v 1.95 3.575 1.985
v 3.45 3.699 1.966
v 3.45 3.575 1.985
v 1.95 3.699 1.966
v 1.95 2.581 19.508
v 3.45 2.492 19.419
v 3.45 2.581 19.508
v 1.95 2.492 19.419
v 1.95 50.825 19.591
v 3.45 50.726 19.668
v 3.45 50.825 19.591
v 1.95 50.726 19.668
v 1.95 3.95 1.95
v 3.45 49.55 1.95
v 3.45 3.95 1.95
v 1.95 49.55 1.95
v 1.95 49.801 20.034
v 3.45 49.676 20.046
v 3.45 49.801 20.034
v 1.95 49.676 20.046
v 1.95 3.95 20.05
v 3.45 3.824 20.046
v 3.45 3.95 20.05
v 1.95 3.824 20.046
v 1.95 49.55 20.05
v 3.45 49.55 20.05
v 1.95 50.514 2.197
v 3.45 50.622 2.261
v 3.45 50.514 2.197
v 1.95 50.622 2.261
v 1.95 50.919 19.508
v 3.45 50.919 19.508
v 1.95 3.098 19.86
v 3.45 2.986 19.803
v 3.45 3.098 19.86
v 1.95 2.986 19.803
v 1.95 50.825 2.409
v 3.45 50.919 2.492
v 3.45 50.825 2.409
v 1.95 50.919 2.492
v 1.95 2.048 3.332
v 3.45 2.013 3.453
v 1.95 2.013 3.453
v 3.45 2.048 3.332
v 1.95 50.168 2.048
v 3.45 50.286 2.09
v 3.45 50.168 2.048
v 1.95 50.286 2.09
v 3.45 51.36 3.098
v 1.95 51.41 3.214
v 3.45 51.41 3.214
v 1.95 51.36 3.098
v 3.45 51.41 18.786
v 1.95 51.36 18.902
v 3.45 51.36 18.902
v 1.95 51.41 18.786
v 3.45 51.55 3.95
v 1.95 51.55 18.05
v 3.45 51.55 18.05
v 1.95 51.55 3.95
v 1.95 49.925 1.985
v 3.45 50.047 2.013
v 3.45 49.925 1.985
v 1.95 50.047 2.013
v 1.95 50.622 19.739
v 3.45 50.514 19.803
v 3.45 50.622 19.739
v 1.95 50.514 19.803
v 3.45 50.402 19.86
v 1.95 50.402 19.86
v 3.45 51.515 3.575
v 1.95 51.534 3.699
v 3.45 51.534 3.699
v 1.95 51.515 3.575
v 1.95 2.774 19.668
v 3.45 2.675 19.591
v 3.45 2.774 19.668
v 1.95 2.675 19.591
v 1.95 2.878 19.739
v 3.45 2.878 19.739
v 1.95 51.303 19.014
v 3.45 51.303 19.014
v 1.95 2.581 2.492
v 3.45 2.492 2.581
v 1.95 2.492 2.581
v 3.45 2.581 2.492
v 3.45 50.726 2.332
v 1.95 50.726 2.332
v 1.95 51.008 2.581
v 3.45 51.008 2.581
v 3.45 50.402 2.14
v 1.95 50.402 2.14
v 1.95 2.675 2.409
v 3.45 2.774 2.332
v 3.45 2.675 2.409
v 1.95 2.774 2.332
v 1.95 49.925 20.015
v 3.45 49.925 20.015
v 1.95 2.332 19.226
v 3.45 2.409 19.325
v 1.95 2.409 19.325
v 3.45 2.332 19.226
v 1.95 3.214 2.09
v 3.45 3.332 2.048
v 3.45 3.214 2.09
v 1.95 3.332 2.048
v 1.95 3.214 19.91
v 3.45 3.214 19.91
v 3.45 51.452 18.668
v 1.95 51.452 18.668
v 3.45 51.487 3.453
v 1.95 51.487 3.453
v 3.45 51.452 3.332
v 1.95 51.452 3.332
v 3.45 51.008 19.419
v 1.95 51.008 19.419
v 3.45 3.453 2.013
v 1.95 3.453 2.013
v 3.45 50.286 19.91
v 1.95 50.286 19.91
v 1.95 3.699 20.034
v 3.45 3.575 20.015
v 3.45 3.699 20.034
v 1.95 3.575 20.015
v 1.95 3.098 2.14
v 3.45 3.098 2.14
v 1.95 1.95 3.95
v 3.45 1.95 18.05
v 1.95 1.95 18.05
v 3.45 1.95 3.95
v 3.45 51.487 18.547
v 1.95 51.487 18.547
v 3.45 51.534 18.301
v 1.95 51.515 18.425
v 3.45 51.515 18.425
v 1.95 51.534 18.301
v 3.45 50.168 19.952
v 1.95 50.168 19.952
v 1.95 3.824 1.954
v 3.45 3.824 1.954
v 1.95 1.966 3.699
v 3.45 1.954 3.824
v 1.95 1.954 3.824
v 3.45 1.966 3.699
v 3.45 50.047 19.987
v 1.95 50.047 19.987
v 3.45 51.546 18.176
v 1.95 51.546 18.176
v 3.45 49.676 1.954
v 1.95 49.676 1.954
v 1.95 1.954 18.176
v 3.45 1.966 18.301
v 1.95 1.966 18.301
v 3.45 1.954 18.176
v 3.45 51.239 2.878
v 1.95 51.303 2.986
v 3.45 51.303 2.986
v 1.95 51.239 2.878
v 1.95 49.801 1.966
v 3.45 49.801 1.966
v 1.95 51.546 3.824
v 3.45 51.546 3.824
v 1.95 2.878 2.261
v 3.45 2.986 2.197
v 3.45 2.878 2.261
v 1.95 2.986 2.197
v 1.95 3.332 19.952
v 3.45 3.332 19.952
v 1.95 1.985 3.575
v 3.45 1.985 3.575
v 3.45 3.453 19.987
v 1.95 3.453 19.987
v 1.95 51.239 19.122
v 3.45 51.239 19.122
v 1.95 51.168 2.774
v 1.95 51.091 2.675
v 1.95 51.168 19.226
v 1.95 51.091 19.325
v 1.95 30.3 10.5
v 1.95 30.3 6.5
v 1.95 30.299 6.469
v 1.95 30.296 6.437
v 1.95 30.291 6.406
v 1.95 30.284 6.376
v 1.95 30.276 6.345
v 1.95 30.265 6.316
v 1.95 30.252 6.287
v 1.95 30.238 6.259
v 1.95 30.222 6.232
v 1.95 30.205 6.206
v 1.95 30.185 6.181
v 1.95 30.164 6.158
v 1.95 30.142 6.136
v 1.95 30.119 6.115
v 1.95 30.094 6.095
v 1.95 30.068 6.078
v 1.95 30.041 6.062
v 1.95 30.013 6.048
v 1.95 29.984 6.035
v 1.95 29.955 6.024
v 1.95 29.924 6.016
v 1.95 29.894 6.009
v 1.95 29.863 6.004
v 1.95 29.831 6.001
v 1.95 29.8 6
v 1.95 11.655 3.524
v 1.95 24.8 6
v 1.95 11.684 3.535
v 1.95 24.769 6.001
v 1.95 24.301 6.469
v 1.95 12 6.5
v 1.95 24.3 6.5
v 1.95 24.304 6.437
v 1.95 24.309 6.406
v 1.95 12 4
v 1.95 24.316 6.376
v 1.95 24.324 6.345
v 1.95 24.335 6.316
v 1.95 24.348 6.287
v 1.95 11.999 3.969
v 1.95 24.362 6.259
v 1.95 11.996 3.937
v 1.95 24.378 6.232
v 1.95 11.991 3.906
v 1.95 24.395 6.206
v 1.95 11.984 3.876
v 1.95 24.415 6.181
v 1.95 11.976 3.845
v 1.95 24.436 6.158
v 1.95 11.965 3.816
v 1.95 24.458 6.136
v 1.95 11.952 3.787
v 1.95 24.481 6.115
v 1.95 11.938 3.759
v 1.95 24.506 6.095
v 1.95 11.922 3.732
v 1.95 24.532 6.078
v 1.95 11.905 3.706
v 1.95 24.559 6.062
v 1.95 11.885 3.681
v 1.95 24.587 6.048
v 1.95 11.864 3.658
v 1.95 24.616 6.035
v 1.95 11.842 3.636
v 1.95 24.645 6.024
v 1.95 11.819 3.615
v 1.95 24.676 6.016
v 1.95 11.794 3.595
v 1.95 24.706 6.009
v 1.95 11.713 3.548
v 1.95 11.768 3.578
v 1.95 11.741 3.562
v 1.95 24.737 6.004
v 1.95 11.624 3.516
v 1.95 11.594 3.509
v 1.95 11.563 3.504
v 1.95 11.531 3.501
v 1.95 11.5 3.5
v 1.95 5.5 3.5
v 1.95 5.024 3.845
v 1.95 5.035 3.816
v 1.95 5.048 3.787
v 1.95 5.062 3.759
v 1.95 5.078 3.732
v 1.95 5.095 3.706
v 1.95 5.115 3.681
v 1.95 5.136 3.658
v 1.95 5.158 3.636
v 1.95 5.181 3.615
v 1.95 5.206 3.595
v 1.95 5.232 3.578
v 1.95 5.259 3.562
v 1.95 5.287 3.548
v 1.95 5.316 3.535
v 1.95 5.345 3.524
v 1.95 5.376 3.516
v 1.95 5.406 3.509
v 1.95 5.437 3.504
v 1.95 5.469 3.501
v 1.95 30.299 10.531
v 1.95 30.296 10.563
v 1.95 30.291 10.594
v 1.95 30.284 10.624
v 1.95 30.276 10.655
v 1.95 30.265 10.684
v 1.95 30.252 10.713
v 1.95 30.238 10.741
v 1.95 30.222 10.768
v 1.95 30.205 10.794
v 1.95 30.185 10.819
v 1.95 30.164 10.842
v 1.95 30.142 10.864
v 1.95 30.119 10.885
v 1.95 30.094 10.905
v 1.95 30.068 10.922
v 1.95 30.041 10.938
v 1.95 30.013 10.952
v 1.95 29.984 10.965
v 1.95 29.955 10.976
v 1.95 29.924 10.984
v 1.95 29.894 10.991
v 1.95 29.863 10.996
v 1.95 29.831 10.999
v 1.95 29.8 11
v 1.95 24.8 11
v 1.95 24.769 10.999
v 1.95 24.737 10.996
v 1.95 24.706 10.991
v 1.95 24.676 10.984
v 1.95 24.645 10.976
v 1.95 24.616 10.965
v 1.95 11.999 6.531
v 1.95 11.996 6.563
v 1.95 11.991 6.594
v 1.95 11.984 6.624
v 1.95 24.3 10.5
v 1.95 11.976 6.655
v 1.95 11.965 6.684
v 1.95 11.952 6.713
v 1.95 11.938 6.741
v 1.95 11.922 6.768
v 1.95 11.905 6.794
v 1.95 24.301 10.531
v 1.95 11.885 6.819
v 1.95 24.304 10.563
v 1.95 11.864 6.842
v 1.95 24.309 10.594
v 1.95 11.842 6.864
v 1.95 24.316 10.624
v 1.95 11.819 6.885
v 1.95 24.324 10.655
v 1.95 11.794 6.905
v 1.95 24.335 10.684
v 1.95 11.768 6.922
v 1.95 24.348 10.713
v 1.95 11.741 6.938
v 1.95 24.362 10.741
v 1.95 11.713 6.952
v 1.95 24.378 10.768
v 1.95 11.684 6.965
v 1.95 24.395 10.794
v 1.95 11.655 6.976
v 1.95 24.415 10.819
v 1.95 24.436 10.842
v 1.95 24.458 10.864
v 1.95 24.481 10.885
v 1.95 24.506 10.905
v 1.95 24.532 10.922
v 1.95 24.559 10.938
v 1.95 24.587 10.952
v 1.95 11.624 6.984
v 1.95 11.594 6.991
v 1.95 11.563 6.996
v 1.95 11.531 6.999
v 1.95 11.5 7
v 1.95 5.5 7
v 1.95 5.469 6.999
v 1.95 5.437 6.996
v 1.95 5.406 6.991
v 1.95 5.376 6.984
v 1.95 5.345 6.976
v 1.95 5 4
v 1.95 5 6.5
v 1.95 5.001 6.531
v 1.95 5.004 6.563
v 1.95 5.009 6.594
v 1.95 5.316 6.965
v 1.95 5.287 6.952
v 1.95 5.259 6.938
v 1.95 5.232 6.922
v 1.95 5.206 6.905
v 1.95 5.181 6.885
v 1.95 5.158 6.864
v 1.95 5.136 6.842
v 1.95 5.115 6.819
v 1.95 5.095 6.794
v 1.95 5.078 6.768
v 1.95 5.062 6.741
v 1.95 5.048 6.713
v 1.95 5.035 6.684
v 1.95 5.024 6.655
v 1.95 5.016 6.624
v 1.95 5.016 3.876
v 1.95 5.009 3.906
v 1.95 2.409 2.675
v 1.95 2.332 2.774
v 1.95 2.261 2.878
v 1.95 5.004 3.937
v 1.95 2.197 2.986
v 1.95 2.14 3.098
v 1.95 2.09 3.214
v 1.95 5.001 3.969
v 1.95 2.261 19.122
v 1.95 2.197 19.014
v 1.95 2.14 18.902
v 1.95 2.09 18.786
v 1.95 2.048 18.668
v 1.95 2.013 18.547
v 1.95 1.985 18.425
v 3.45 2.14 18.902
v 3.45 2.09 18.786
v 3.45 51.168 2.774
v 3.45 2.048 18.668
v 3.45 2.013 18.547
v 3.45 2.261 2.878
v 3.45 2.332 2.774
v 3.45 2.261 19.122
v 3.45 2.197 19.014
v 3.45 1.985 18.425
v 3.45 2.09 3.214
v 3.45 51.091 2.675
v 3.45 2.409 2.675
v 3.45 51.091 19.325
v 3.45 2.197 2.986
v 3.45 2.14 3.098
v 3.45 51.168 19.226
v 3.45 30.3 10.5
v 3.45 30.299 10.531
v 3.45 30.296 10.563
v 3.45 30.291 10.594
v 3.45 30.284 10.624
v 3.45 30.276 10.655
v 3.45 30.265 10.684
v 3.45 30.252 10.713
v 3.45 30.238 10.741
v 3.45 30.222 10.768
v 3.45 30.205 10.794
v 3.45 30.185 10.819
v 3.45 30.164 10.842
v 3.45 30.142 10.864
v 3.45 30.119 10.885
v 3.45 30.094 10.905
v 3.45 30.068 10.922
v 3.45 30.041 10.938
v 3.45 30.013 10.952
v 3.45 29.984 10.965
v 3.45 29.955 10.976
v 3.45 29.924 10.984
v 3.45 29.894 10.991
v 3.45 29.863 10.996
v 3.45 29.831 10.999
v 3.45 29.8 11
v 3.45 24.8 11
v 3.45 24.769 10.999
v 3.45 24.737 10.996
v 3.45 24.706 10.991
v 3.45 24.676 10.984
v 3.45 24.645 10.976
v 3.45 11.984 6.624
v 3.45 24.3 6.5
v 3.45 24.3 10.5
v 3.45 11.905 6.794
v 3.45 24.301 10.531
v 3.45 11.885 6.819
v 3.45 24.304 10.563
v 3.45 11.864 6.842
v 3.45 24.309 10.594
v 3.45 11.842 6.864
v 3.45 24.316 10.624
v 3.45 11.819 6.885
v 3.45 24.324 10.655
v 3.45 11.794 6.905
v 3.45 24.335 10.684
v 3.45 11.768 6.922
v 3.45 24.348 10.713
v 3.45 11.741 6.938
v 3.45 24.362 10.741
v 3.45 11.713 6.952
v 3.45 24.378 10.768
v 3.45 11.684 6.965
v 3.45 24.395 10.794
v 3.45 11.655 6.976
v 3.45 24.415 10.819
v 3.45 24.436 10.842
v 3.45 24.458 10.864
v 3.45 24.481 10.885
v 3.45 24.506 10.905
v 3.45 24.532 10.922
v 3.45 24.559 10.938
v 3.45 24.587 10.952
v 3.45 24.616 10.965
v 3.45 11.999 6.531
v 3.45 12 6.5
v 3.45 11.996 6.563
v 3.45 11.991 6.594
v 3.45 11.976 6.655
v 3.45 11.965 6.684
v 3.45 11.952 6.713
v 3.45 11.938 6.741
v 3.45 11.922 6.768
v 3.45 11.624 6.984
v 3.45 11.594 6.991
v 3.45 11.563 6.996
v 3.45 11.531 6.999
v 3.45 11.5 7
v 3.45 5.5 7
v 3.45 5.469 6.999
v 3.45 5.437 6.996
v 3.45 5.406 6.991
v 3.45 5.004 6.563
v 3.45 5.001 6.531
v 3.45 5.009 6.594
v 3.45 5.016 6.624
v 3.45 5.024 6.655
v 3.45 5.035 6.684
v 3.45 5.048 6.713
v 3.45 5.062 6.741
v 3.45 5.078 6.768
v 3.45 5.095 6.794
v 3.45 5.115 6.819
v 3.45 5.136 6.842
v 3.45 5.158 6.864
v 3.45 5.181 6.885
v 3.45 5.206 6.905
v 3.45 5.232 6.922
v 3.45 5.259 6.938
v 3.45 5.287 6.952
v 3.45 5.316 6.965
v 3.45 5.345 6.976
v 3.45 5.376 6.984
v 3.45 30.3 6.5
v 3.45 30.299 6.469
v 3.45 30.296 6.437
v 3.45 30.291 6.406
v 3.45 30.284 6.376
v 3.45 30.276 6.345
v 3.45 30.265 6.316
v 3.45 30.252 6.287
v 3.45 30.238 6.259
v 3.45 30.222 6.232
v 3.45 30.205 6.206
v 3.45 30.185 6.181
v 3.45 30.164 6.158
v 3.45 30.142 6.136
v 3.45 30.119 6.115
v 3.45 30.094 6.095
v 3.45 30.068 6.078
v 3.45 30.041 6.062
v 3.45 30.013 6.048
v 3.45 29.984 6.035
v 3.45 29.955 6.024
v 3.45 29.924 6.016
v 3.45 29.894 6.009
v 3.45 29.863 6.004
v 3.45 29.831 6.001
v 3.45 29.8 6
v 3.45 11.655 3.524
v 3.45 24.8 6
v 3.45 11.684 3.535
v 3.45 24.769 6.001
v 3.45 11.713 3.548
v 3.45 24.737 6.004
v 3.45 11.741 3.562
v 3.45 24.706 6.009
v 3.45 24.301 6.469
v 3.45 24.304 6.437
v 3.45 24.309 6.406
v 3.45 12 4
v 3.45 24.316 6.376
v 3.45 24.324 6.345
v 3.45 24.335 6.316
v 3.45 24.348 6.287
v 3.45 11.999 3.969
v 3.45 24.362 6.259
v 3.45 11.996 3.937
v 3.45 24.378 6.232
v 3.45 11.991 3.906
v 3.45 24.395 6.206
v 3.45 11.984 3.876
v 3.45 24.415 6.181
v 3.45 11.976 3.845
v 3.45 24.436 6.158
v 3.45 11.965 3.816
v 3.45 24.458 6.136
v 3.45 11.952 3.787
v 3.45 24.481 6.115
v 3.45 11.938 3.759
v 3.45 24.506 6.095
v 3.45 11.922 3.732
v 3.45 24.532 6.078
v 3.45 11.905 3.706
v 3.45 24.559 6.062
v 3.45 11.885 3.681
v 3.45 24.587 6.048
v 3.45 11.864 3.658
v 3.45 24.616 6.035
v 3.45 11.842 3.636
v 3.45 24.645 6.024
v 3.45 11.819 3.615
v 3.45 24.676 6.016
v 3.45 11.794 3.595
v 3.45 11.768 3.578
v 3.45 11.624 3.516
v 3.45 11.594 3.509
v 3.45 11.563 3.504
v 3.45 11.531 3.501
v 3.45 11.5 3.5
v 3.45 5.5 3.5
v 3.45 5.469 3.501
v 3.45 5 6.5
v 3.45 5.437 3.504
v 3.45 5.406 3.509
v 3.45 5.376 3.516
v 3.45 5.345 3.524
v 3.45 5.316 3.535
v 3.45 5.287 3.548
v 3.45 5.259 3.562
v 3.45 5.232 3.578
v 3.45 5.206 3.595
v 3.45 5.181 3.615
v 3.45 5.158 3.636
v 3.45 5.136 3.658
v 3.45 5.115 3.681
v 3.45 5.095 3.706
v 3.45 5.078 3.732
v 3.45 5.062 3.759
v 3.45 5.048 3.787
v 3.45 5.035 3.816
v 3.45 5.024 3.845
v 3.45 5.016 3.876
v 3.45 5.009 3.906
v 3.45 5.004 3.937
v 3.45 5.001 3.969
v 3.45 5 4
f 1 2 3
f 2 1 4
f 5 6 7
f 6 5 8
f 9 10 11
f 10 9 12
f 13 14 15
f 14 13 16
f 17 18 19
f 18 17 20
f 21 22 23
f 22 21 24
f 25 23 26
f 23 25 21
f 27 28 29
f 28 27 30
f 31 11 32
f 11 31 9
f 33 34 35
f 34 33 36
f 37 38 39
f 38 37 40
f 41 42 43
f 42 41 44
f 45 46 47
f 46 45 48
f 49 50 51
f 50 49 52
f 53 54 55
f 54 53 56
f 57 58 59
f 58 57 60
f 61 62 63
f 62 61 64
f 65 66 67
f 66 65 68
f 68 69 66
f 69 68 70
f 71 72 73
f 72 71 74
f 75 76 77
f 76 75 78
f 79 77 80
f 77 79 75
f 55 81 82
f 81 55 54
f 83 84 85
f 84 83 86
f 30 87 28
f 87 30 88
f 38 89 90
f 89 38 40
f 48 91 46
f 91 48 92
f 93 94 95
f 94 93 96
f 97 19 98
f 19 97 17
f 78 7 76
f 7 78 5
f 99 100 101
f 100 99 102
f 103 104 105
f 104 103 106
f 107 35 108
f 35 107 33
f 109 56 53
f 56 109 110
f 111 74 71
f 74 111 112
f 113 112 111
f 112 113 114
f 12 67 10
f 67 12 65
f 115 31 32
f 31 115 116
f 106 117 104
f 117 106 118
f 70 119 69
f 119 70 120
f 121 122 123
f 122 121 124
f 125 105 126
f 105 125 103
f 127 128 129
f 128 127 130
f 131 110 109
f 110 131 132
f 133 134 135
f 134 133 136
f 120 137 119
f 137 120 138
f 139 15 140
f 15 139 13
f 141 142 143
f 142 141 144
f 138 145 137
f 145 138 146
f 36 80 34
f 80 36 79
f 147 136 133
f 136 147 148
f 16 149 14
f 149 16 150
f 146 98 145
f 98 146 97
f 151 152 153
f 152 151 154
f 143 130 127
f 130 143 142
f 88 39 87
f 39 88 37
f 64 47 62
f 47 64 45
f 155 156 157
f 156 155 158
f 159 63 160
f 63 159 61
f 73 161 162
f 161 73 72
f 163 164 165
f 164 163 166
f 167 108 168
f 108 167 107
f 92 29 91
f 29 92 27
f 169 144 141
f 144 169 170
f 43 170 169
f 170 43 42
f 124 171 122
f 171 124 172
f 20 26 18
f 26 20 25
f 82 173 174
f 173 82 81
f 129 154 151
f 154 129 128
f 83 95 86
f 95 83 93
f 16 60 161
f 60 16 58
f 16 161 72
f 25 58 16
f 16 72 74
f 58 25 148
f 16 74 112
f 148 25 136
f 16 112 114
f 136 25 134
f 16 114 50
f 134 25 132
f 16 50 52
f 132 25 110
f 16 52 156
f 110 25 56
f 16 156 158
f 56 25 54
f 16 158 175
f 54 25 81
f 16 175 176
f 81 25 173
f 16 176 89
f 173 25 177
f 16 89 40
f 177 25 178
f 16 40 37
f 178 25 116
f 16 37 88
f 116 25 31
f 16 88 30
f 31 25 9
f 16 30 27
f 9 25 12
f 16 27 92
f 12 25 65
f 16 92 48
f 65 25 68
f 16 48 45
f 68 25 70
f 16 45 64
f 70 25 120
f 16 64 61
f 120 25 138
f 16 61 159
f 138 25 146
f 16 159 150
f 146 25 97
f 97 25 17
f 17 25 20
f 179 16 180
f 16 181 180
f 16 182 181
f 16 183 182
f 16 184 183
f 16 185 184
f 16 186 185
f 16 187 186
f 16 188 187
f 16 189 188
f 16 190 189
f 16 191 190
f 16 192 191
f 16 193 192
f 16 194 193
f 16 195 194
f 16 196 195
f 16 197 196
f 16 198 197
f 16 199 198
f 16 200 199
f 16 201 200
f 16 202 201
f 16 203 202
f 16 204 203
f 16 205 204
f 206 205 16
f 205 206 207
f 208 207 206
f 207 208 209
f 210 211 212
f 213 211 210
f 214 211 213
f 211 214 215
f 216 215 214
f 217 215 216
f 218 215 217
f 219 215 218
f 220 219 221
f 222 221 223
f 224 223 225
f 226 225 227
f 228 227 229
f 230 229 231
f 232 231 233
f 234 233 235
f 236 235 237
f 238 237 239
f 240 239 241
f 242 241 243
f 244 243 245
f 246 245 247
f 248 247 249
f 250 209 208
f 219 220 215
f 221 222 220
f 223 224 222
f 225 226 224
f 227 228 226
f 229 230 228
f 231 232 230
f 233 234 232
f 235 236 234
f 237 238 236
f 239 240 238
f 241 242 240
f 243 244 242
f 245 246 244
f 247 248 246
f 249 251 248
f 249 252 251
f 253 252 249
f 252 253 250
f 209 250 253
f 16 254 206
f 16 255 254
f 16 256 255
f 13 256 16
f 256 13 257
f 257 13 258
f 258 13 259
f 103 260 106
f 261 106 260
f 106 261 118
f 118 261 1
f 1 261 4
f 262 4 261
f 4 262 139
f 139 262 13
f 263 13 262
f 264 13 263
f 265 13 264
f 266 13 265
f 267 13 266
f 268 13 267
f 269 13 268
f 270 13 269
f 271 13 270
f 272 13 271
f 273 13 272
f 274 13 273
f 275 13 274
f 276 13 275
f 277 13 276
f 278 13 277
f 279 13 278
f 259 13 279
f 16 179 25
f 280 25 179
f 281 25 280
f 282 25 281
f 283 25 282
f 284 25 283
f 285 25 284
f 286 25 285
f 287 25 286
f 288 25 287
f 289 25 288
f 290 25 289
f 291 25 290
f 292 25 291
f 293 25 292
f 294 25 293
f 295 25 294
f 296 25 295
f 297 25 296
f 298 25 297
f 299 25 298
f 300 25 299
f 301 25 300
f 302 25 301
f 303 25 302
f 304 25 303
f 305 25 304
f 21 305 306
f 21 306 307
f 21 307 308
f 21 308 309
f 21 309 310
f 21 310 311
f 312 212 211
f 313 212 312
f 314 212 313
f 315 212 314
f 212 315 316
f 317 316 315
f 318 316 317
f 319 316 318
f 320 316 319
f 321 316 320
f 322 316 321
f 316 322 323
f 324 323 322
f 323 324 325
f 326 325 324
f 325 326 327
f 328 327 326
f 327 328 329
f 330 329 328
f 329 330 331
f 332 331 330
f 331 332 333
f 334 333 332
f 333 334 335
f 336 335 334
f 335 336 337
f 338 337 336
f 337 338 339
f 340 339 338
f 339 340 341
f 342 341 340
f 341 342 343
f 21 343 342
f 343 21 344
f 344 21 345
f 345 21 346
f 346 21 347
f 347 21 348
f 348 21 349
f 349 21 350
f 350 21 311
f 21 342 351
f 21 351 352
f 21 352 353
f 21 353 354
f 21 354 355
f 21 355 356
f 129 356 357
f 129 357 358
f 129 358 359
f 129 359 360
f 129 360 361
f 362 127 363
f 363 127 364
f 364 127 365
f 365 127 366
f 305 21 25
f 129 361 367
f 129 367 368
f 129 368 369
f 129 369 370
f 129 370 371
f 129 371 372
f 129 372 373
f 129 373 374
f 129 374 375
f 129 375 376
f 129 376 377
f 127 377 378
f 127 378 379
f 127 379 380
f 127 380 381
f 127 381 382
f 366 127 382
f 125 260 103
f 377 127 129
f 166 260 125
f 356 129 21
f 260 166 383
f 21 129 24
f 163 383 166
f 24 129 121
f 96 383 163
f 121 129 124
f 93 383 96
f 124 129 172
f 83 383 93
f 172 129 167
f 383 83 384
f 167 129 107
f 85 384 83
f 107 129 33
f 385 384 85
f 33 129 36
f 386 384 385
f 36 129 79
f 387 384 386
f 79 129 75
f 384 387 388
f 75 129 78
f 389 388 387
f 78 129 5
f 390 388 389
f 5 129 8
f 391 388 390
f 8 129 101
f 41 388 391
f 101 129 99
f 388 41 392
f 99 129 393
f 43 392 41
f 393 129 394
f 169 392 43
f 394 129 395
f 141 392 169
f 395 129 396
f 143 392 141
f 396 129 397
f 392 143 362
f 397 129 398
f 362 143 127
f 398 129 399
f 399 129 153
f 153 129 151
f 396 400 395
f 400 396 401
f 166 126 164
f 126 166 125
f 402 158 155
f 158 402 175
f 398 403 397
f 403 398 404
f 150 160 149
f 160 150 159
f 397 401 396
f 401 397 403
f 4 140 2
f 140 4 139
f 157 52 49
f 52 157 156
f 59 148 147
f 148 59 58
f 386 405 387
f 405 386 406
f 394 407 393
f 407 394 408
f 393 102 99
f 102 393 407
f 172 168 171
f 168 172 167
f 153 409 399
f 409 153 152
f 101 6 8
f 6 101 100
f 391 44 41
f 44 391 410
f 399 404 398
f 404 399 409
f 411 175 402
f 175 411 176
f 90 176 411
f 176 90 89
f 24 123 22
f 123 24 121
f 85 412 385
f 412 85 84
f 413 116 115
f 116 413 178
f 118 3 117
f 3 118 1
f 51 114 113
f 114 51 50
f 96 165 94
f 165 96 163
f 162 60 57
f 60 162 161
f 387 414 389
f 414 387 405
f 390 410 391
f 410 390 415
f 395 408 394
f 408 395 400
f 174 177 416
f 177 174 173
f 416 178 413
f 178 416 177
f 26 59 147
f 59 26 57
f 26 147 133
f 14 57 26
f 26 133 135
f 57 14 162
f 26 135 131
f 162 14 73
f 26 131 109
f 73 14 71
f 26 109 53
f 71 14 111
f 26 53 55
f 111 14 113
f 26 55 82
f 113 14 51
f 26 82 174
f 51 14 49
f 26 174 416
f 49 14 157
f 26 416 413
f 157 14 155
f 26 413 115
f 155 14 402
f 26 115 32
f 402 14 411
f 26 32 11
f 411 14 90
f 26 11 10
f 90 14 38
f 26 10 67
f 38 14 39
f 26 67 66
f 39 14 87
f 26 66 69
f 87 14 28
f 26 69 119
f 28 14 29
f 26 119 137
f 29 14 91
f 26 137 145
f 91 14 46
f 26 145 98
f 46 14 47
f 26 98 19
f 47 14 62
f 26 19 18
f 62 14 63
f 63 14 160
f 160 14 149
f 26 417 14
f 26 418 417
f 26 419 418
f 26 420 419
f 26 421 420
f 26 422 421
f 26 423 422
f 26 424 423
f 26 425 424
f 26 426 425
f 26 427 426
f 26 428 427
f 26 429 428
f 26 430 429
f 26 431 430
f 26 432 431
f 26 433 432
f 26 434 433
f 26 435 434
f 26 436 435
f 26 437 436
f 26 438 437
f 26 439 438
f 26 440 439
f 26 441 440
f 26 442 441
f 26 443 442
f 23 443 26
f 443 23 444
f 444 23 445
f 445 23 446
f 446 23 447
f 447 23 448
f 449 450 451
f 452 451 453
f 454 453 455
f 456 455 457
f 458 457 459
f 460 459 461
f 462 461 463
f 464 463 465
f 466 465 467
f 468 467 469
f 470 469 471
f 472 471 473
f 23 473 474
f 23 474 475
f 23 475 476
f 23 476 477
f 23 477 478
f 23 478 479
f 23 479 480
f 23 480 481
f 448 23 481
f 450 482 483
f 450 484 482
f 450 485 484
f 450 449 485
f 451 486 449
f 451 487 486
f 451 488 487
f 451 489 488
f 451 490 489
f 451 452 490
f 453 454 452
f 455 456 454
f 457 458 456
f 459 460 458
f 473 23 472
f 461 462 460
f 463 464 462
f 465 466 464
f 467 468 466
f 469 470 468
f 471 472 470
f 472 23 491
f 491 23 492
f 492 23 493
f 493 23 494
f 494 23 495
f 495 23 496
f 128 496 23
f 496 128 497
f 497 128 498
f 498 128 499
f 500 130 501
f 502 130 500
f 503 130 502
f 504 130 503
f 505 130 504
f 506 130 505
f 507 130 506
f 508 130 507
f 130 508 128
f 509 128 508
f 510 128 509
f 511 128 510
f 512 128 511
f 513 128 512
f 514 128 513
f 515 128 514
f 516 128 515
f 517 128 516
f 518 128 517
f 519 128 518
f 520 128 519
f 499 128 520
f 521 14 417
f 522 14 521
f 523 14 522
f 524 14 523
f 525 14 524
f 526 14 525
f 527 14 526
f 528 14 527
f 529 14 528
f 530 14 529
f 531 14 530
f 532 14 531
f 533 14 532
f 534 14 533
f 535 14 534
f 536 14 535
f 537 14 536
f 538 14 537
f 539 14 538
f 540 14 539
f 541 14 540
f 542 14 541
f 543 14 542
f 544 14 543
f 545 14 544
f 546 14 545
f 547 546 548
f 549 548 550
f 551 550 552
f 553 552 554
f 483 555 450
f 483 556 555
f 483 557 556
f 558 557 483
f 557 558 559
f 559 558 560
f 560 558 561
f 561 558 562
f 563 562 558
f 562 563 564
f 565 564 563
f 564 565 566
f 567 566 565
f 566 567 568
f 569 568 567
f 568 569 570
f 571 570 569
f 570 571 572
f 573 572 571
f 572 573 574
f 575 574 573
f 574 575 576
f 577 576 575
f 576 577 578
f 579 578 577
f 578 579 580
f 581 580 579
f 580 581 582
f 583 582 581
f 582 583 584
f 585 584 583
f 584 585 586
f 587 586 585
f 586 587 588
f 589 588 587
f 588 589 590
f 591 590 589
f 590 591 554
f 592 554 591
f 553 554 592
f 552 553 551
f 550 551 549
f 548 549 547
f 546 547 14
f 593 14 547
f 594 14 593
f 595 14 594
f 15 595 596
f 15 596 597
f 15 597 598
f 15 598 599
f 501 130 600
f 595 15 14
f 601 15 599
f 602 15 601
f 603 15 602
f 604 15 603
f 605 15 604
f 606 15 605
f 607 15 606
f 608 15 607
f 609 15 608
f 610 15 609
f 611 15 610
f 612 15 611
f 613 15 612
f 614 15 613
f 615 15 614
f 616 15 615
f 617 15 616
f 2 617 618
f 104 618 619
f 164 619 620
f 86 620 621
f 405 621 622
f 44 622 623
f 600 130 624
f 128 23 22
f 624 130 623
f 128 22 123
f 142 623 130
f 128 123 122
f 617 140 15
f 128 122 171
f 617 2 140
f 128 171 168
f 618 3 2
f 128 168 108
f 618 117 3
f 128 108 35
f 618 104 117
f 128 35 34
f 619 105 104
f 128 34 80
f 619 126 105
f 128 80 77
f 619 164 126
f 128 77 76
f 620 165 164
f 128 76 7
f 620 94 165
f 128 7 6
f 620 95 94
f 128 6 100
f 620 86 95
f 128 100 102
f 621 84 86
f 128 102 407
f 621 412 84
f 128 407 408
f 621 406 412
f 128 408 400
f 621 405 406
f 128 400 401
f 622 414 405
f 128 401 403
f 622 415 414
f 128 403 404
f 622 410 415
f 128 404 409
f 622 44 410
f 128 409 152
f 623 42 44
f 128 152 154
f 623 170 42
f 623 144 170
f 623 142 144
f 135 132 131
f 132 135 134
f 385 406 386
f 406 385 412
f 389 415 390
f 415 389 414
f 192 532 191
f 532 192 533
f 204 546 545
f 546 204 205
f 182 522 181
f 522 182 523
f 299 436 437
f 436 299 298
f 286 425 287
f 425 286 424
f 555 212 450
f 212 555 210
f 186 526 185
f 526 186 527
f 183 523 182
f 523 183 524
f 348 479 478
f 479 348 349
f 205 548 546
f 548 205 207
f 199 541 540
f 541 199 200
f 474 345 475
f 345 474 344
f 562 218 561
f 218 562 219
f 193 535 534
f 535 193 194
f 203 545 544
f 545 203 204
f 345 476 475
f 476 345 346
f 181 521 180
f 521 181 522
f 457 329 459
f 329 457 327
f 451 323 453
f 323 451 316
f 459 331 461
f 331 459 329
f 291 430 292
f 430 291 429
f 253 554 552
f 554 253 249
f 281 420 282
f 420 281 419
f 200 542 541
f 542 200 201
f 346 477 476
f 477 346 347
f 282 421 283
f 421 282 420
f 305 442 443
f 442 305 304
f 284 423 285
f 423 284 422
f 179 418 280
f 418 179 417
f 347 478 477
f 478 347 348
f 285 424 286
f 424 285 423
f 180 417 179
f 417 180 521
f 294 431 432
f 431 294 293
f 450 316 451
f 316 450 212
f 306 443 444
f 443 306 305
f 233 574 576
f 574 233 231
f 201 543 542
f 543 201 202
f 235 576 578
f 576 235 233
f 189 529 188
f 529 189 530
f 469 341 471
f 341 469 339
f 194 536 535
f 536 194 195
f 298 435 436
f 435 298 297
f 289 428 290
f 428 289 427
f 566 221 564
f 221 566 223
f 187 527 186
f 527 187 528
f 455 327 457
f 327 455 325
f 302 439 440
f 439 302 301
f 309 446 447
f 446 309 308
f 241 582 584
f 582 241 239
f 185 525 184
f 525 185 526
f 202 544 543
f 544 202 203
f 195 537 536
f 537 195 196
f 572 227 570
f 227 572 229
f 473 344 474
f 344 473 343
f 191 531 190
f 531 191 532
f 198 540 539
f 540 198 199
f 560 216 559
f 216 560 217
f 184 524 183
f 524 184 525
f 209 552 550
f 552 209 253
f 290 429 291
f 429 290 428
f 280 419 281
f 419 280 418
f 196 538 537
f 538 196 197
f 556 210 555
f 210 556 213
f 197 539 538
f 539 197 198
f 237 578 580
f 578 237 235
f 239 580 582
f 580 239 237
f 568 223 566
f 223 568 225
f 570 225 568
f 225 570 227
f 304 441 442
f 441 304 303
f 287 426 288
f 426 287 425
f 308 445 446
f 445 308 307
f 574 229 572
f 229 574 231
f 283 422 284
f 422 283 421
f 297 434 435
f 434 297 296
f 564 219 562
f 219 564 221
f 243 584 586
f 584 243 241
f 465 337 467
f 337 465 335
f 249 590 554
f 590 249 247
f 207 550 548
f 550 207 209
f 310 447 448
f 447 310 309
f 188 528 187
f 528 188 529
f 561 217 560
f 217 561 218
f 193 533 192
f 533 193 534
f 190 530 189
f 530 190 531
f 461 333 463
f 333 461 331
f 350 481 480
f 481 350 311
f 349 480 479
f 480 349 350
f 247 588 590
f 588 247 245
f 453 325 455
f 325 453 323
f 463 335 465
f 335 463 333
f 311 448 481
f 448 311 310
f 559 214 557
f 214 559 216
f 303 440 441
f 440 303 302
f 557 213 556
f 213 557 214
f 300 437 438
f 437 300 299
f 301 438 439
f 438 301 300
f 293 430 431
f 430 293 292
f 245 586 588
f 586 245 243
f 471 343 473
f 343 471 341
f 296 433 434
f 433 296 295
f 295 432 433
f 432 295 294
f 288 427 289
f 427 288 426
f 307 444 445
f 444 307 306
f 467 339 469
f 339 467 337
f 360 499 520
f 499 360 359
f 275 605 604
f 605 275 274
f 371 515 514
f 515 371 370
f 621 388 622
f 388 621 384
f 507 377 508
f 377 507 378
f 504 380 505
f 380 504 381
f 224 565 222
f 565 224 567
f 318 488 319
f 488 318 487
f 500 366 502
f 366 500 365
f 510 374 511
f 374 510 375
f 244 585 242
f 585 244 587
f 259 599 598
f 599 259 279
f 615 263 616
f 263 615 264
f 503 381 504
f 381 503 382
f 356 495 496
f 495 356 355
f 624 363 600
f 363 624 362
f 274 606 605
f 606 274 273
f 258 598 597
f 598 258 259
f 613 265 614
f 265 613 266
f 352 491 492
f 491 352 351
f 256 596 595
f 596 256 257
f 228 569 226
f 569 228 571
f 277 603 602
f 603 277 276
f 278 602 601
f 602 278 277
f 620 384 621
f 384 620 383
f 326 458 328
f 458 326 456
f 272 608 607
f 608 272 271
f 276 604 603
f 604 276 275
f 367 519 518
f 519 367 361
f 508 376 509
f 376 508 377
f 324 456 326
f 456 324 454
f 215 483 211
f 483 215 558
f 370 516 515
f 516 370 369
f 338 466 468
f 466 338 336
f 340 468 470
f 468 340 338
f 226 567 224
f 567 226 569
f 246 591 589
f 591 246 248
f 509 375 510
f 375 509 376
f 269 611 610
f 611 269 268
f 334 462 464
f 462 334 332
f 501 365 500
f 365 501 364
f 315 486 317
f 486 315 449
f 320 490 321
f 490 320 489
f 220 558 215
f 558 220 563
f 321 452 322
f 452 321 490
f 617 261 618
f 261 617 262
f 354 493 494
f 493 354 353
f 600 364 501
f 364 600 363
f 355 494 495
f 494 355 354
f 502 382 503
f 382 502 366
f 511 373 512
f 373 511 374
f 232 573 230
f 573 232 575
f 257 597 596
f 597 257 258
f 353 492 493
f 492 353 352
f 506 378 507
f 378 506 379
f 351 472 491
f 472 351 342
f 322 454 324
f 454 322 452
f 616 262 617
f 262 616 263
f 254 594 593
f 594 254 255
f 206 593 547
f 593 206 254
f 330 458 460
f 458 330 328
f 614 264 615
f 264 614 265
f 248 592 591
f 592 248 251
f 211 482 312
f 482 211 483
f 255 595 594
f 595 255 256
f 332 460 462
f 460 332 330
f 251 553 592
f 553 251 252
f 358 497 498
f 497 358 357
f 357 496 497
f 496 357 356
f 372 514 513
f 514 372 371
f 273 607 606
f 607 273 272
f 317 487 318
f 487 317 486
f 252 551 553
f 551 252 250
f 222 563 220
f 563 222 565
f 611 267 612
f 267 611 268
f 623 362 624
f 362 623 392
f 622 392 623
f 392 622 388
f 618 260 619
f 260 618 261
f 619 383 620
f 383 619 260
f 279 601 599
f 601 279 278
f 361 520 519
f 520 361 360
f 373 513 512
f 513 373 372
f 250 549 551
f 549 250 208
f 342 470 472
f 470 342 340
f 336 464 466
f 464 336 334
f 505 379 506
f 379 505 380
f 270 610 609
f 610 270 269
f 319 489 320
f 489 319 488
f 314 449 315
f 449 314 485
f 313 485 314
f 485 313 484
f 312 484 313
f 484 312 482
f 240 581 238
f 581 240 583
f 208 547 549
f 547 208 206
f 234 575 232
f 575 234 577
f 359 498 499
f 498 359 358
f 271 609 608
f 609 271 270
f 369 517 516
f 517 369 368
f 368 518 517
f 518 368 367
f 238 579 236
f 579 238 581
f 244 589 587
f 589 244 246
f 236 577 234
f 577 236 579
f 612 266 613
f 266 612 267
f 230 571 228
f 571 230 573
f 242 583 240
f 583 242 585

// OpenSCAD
/*//////////////////////////////////////////////////////////////////
              -    FB Aka Heartman/Hearty 2016     -                   
              -   http://heartygfx.blogspot.com    -                  
              -       OpenScad Parametric Box      -                     
              -         CC BY-NC 3.0 License       -                      
////////////////////////////////////////////////////////////////////                                                                                                             
12/02/2016 - Fixed minor bug 
28/02/2016 - Added holes ventilation option                    
09/03/2016 - Added PCB feet support, fixed the shell artefact on export mode. 

*/////////////////////////// - Info - //////////////////////////////

// All coordinates are starting as integrated circuit pins.
// From the top view :

//   CoordD           <---       CoordC
//                                 ^
//                                 ^
//                                 ^
//   CoordA           --->       CoordB


////////////////////////////////////////////////////////////////////


////////// - Paramètres de la boite - Box parameters - /////////////

/* [Box dimensions] */
// - Longueur - Length  
  Length        = 52.5;
// - Largeur - Width
  Width         = 53.5;                     
// - Hauteur - Height  
  Height        = 22;  
// - Epaisseur - Wall thickness  
  Thick         = 1.5;//[2:5]  
  
/* [Box options] */
// - Diamètre Coin arrondi - Filet diameter  
  Filet         = 2;//[0.1:12] 
// - lissage de l'arrondi - Filet smoothness  
  Resolution    = 50;//[1:100] 
// - Tolérance - Tolerance (Panel/rails gap)
  m             = 0.9;
// Pieds PCB - PCB feet (x4) 
  PCBFeet       = 0;// [0:No, 1:Yes]
// - Decorations to ventilation holes
  Vent          = 1;// [0:No, 1:Yes]
// - Decoration-Holes width (in mm)
  Vent_width    = 1.5;   


  
/* [PCB_Feet] */
//All dimensions are from the center foot axis

// - Coin bas gauche - Low left corner X position
PCBPosX         = 1;
// - Coin bas gauche - Low left corner Y position
PCBPosY         = 1;
// - Longueur PCB - PCB Length
PCBLength       = 45;
// - Largeur PCB - PCB Width
PCBWidth        = 44.3;
// - Heuteur pied - Feet height
FootHeight      = 3;
// - Diamètre pied - Foot diameter
FootDia         = 5;
// - Diamètre trou - Hole diameter
FootHole        = 2;  
  

/* [STL element to export] */
//Coque haut - Top shell
TShell          = 0;// [0:No, 1:Yes]
//Coque bas- Bottom shell
BShell          = 0;// [0:No, 1:Yes]
//Panneau avant - Front panel
FPanL           = 0;// [0:No, 1:Yes]
//Panneau arrière - Back panel  
BPanL           = 1;// [0:No, 1:Yes]


  
/* [Hidden] */
// - Couleur coque - Shell color  
Couleur1        = "Orange";       
// - Couleur panneaux - Panels color    
Couleur2        = "OrangeRed";    
// Thick X 2 - making decorations thicker if it is a vent to make sure they go through shell
Dec_Thick       = Vent ? Thick*2 : Thick; 
// - Depth decoration
Dec_size        = Vent ? Thick*2 : 0.8;





/////////// - Boitier générique bord arrondis - Generic rounded box - //////////

module RoundBox($a=Length, $b=Width, $c=Height){// Cube bords arrondis
                    $fn=Resolution;            
                    translate([0,Filet,Filet]){  
                    minkowski (){                                              
                        cube ([$a-(Length/2),$b-(2*Filet),$c-(2*Filet)], center = false);
                        rotate([0,90,0]){    
                        cylinder(r=Filet,h=Length/2, center = false);
                            } 
                        }
                    }
                }// End of RoundBox Module

      
////////////////////////////////// - Module Coque/Shell - //////////////////////////////////         

module Coque(){//Coque - Shell  
    Thick = Thick*2;  
    difference(){    
        difference(){//sides decoration
            union(){    
                     difference() {//soustraction de la forme centrale - Substraction Fileted box
                      
                        difference(){//soustraction cube median - Median cube slicer
                            union() {//union               
                            difference(){//Coque    
                                RoundBox();
                                translate([Thick/2,Thick/2,Thick/2]){     
                                        RoundBox($a=Length-Thick, $b=Width-Thick, $c=Height-Thick);
                                        }
                                        }//Fin diff Coque                            
                                difference(){//largeur Rails        
                                     translate([Thick+m,Thick/2,Thick/2]){// Rails
                                          RoundBox($a=Length-((2*Thick)+(2*m)), $b=Width-Thick, $c=Height-(Thick*2));
                                                          }//fin Rails
                                     translate([((Thick+m/2)*1.55),Thick/2,Thick/2+0.1]){ // +0.1 added to avoid the artefact
                                          RoundBox($a=Length-((Thick*3)+2*m), $b=Width-Thick, $c=Height-Thick);
                                                    }           
                                                }//Fin largeur Rails
                                    }//Fin union                                   
                               translate([-Thick,-Thick,Height/2]){// Cube à soustraire
                                    cube ([Length+100, Width+100, Height], center=false);
                                            }                                            
                                      }//fin soustraction cube median - End Median cube slicer
                               translate([-Thick/2,Thick,Thick]){// Forme de soustraction centrale 
                                    RoundBox($a=Length+Thick, $b=Width-Thick*2, $c=Height-Thick);       
                                    }                          
                                }                                          


                difference(){// wall fixation box legs
                    union(){
                        translate([3*Thick +5,Thick,Height/2]){
                            rotate([90,0,0]){
                                    $fn=6;
                                    cylinder(d=16,Thick/2);
                                    }   
                            }
                            
                       translate([Length-((3*Thick)+5),Thick,Height/2]){
                            rotate([90,0,0]){
                                    $fn=6;
                                    cylinder(d=16,Thick/2);
                                    }   
                            }

                        }
                            translate([4,Thick+Filet,Height/2-57]){   
                             rotate([45,0,0]){
                                   cube([Length,40,40]);    
                                  }
                           }
                           translate([0,-(Thick*1.46),Height/2]){
                                cube([Length,Thick*2,10]);
                           }
                    } //Fin fixation box legs
            }

        union(){// outbox sides decorations
            
            for(i=[0:Thick:Length/4]){

                // Ventilation holes part code submitted by Ettie - Thanks ;) 
                    translate([10+i,-Dec_Thick+Dec_size,1]){
                    cube([Vent_width,Dec_Thick,Height/4]);
                    }
                    translate([(Length-10) - i,-Dec_Thick+Dec_size,1]){
                    cube([Vent_width,Dec_Thick,Height/4]);
                    }
                    translate([(Length-10) - i,Width-Dec_size,1]){
                    cube([Vent_width,Dec_Thick,Height/4]);
                    }
                    translate([10+i,Width-Dec_size,1]){
                    cube([Vent_width,Dec_Thick,Height/4]);
                    }
  
                
                    }// fin de for
               // }
                }//fin union decoration
            }//fin difference decoration


            union(){ //sides holes
                $fn=50;
                translate([3*Thick+5,20,Height/2+4]){
                    rotate([90,0,0]){
                    cylinder(d=2,20);
                    }
                }
                translate([Length-((3*Thick)+5),20,Height/2+4]){
                    rotate([90,0,0]){
                    cylinder(d=2,20);
                    }
                }
                translate([3*Thick+5,Width+5,Height/2-4]){
                    rotate([90,0,0]){
                    cylinder(d=2,20);
                    }
                }
                translate([Length-((3*Thick)+5),Width+5,Height/2-4]){
                    rotate([90,0,0]){
                    cylinder(d=2,20);
                    }
                }
            }//fin de sides holes

        }//fin de difference holes
}// fin coque 

////////////////////////////// - Experiment - ///////////////////////////////////////////





/////////////////////// - Foot with base filet - /////////////////////////////
module foot(FootDia,FootHole,FootHeight){
    Filet=2;
    color(Couleur1)   
    translate([0,0,Filet-1.5])
    difference(){
    
    difference(){
            //translate ([0,0,-Thick]){
                cylinder(d=FootDia+Filet,FootHeight-Thick, $fn=100);
                        //}
                    rotate_extrude($fn=100){
                            translate([(FootDia+Filet*2)/2,Filet,0]){
                                    minkowski(){
                                            square(10);
                                            circle(Filet, $fn=100);
                                        }
                                 }
                           }
                   }
            cylinder(d=FootHole,FootHeight+1, $fn=100);
               }          
}// Fin module foot
  
module Feet(){     
//////////////////// - PCB only visible in the preview mode - /////////////////////    
    translate([3*Thick+2,Thick+5,FootHeight+(Thick/2)-0.5]){
    
    %square ([PCBLength+10,PCBWidth+10]);
       translate([PCBLength/2,PCBWidth/2,0.5]){ 
        color("Olive")
        %text("PCB", halign="center", valign="center", font="Arial black");
       }
    } // Fin PCB 
  
    
////////////////////////////// - 4 Feet - //////////////////////////////////////////     
    translate([3*Thick+7,Thick+10,Thick/2]){
        foot(FootDia,FootHole,FootHeight);
    }
    translate([(3*Thick)+PCBLength+7,Thick+10,Thick/2]){
        foot(FootDia,FootHole,FootHeight);
        }
    translate([(3*Thick)+PCBLength+7,(Thick)+PCBWidth+10,Thick/2]){
        foot(FootDia,FootHole,FootHeight);
        }        
    translate([3*Thick+7,(Thick)+PCBWidth+10,Thick/2]){
        foot(FootDia,FootHole,FootHeight);
    }   

} // Fin du module Feet
 


 
 ////////////////////////////////////////////////////////////////////////
////////////////////// <- Holes Panel Manager -> ///////////////////////
////////////////////////////////////////////////////////////////////////

//                           <- Panel ->  
module Panel(Length,Width,Thick,Filet){
    scale([0.5,1,1])
    minkowski(){
            cube([Thick,Width-(Thick*2+Filet*2+m),Height-(Thick*2+Filet*2+m)]);
            translate([0,Filet,Filet])
            rotate([0,90,0])
            cylinder(r=Filet,h=Thick, $fn=100);
      }
}



//                          <- Circle hole -> 
// Cx=Cylinder X position | Cy=Cylinder Y position | Cdia= Cylinder dia | Cheight=Cyl height
module CylinderHole(OnOff,Cx,Cy,Cdia){
    if(OnOff==1)
    translate([Cx,Cy,-1])
        cylinder(d=Cdia,10, $fn=50);
}
//                          <- Square hole ->  
// Sx=Square X position | Sy=Square Y position | Sl= Square Length | Sw=Square Width | Filet = Round corner
module SquareHole(OnOff,Sx,Sy,Sl,Sw,Filet){
    if(OnOff==1)
     minkowski(){
        translate([Sx+Filet/2,Sy+Filet/2,-1])
            cube([Sl-Filet,Sw-Filet,10]);
            cylinder(d=Filet,h=10, $fn=100);
       }
}


 
//                      <- Linear text panel -> 
module LText(OnOff,Tx,Ty,Font,Size,Content){
    if(OnOff==1)
    translate([Tx,Ty,Thick+.5])
    linear_extrude(height = 0.5){
    text(Content, size=Size, font=Font);
    }
}
//                     <- Circular text panel->  
module CText(OnOff,Tx,Ty,Font,Size,TxtRadius,Angl,Turn,Content){ 
      if(OnOff==1) {
      Angle = -Angl / len(Content);
      translate([Tx,Ty,Thick+.5])
          for (i= [0:len(Content)-1] ){   
              rotate([0,0,i*Angle+90+Turn])
              translate([0,TxtRadius,0]) {
                linear_extrude(height = 0.5){
                text(Content[i], font = Font, size = Size,  valign ="baseline", halign ="center");
                    }
                }   
             }
      }
}
////////////////////// <- New module Panel -> //////////////////////
module FPanL(){
    difference(){
        color(Couleur2)
        Panel(Length,Width,Thick,Filet);
    
 
    rotate([90,0,90]){
        color(Couleur2){
//                     <- Cutting shapes from here ->  
        SquareHole  (1,8.2,4,14.4,6.5,1); //(On/Off, Xpos,Ypos,Length,Width,Filet)
        SquareHole  (1,27,4,14.4,6.5,1); //(On/Off, Xpos,Ypos,Length,Width,Filet)
            
//        CylinderHole(1,27,40,8);       //(On/Off, Xpos, Ypos, Diameter)
//                            <- To here -> 
           }
       }
}

    color(Couleur1){
        translate ([-.5,0,0])
        rotate([90,0,90]){
//                      <- Adding text from here ->          
//        LText(1,43,13,"Arial Black",3,"GPS");//(On/Off, Xpos, Ypos, "Font", Size, "Text")
//        LText(1,41,6,"Arial Black",3,"Clock");            
//                            <- To here ->
            }
      }
}


/////////////////////////// <- Main part -> /////////////////////////

if(TShell==1) {
// Coque haut - Top Shell
    difference() {
        color( Couleur1,1){
            translate([0,Width,Height+0.2]){
                rotate([0,180,180]){
                        Coque();
                        }
                }
        }

    color(Couleur2){
    translate ([15,17,21]){rotate([0,0,90]){cylinder(h=8,r1=4,r2=4,center=true);}}

    translate ([15,36,21]){rotate([0,0,90]){cylinder(h=8,r1=4,r2=4,center=true);}}

    translate ([35,17,21]){rotate([0,0,90]){cylinder(h=8,r1=4,r2=4,center=true);}}

    translate ([35,36,21]){rotate([0,0,90]){cylinder(h=8,r1=4,r2=4,center=true);}}
    }
    }
}
if(BShell==1)
{
// Coque bas - Bottom shell
        color(Couleur1){ 
        Coque();
        }

    color(Couleur2){
        translate ([50,90,1.8])
        rotate([0,180,90]){
//        LText(1,17,33,"Arial Black",6,"IBE Group");            
//        LText(1,15,18,"Arial Black",6,"Copyright©");            
        //LText(1,28,2,"Arial Black",6,"2018");            
//                            <- To here ->
            }
      }


}
// Pied support PCB - PCB feet
if (PCBFeet==1)
// Feet
        translate([PCBPosX,PCBPosY,0]){ 
        Feet();
        }

// Panneau avant - Front panel  <<<<<< Text and holes only on this one.
//rotate([0,-90,-90]) 
if(FPanL==1)
        translate([Length-(Thick*2+m/2),Thick+m/2,Thick+m/2])
        FPanL();

//Panneau arrière - Back panel
if(BPanL==1) {
difference() { 

    difference() { 
        color(Couleur2)
        translate([Thick+m/2,Thick+m/2,Thick+m/2])
        Panel(Length,Width,Thick,Filet);
    
        rotate([90,0,90]){
            color(Couleur1)
            SquareHole  (1,24.3,6,6,5,1); //(On/Off, Xpos,Ypos,Length,Width,Filet)
        }
    }    

        rotate([90,0,90]){
            color(Couleur1)
            SquareHole  (1,5,3.5,7,3.5,1); //(On/Off, Xpos,Ypos,Length,Width,Filet)
        }




}


}
